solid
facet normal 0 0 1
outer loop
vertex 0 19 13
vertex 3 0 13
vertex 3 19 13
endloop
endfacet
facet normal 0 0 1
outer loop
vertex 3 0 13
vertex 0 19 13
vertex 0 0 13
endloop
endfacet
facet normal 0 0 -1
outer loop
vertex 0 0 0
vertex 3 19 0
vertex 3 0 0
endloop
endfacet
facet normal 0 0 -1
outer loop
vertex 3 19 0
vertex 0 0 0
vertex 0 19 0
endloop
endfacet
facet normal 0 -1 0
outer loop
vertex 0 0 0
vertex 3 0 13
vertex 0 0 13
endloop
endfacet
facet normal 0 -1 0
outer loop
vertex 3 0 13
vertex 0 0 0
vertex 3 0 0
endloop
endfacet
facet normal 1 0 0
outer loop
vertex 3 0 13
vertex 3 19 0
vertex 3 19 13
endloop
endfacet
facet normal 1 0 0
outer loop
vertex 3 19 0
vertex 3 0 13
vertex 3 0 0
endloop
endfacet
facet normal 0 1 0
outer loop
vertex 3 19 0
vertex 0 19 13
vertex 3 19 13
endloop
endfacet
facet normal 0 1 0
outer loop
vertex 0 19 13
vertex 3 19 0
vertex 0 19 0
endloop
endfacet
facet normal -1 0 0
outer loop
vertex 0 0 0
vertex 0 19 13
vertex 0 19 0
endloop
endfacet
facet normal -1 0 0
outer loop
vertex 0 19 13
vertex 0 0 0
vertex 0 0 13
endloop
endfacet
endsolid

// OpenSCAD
// Generated by SolidPython 1.0.1 on 2020-07-29 00:46:54


cube(size = [3, 19, 13]);
/***********************************************
*********      SolidPython code:      **********
************************************************
 
# import packages: SolidPython
from solid import *
from solid.utils import *
from itertools import chain, combinations, permutations


class Resize:

    def __init__(self, scad_file):
        self.scad_file = scad_file
        #self.scad_file = import_scad(scad_file)
        # cone/cylinder param:
        self.r1 = 0
        self.r2 = 0
        self.h = 0
        # rectangular prism param:
        self.w = 0
        self.l = 0
        # ellipse param:
        self.r = 0

    # import OpenScad code (file name corresponds to shape)


    # classify shape + parameters
    def assign(self, param1, param2, param3):
        if self.scad_file == 'cone.scad':
            self.r1 = param1
            self.r2 = param2
            self.h = param3
        elif self.scad_file == 'cylinder.scad':
            self.r1 = param1
            self.r2 = param2
            self.h = param3
        elif self.scad_file == 'rectangularPrism.scad':
            self.h = param1
            self.l = param2
            self.w = param3
        else:
            self.r = param1
            self.h = param2

    # resize parameters
    def iterate(self):
        x = range(3, 20, 2)
        i = 1
        if self.scad_file == 'cone.scad':
            tempList = list(permutations(x, 2))
            for temp in tempList:
                param1 = temp[0]
                param2 = temp[1]
                filepath = 'produced_scad_files/' + 'cone' + str(param1) + '_' + str(param2) + '_' + '.scad'
                scad_render_to_file(cylinder(h=param1, r1=param2, r2=0), filepath)

        elif self.scad_file == 'cylinder.scad':
            tempList = list(permutations(x, 3))
            for temp in tempList:
                param1 = temp[0]
                param2 = temp[1]
                filepath = 'produced_scad_files/' + 'cylinder' + str(param1) + '_' + str(param2) + '_' + '.scad'
                scad_render_to_file(cylinder(h=param1, r1=param2, r2=param2), filepath)

        elif self.scad_file == 'rectangularPrism.scad':
            tempList = list(permutations(x, 3))
            for temp in tempList:
                param1 = temp[0]
                param2 = temp[1]
                param3 = temp[2]
                filepath = 'produced_scad_files/' + 'rectangularPrism' + str(param1) + '_' + str(param2) + '_' + str(
                    param3) + '.scad'
                scad_render_to_file(cube(size=(param1, param2, param3)), filepath)

        elif self.scad_file == 'ellipse.scad':
            tempList = list(permutations(x, 4))
            for temp in tempList:
                param1 = temp[0]
                param2 = temp[1]
                param3 = temp[2]
                param4 = temp[3]
                filepath = 'produced_scad_files/' + 'ellipse' + str(param1) + '_' + str(param2) + '_' + str(param3) + '_' + str(param4) + '.scad'
                scad_render_to_file(scale([param1, param2, param3])(sphere(r=param4)), filepath)

    def render_to_scadfile(self):
        scad_render_to_file(scad, 'example.scad') 
 
************************************************/
